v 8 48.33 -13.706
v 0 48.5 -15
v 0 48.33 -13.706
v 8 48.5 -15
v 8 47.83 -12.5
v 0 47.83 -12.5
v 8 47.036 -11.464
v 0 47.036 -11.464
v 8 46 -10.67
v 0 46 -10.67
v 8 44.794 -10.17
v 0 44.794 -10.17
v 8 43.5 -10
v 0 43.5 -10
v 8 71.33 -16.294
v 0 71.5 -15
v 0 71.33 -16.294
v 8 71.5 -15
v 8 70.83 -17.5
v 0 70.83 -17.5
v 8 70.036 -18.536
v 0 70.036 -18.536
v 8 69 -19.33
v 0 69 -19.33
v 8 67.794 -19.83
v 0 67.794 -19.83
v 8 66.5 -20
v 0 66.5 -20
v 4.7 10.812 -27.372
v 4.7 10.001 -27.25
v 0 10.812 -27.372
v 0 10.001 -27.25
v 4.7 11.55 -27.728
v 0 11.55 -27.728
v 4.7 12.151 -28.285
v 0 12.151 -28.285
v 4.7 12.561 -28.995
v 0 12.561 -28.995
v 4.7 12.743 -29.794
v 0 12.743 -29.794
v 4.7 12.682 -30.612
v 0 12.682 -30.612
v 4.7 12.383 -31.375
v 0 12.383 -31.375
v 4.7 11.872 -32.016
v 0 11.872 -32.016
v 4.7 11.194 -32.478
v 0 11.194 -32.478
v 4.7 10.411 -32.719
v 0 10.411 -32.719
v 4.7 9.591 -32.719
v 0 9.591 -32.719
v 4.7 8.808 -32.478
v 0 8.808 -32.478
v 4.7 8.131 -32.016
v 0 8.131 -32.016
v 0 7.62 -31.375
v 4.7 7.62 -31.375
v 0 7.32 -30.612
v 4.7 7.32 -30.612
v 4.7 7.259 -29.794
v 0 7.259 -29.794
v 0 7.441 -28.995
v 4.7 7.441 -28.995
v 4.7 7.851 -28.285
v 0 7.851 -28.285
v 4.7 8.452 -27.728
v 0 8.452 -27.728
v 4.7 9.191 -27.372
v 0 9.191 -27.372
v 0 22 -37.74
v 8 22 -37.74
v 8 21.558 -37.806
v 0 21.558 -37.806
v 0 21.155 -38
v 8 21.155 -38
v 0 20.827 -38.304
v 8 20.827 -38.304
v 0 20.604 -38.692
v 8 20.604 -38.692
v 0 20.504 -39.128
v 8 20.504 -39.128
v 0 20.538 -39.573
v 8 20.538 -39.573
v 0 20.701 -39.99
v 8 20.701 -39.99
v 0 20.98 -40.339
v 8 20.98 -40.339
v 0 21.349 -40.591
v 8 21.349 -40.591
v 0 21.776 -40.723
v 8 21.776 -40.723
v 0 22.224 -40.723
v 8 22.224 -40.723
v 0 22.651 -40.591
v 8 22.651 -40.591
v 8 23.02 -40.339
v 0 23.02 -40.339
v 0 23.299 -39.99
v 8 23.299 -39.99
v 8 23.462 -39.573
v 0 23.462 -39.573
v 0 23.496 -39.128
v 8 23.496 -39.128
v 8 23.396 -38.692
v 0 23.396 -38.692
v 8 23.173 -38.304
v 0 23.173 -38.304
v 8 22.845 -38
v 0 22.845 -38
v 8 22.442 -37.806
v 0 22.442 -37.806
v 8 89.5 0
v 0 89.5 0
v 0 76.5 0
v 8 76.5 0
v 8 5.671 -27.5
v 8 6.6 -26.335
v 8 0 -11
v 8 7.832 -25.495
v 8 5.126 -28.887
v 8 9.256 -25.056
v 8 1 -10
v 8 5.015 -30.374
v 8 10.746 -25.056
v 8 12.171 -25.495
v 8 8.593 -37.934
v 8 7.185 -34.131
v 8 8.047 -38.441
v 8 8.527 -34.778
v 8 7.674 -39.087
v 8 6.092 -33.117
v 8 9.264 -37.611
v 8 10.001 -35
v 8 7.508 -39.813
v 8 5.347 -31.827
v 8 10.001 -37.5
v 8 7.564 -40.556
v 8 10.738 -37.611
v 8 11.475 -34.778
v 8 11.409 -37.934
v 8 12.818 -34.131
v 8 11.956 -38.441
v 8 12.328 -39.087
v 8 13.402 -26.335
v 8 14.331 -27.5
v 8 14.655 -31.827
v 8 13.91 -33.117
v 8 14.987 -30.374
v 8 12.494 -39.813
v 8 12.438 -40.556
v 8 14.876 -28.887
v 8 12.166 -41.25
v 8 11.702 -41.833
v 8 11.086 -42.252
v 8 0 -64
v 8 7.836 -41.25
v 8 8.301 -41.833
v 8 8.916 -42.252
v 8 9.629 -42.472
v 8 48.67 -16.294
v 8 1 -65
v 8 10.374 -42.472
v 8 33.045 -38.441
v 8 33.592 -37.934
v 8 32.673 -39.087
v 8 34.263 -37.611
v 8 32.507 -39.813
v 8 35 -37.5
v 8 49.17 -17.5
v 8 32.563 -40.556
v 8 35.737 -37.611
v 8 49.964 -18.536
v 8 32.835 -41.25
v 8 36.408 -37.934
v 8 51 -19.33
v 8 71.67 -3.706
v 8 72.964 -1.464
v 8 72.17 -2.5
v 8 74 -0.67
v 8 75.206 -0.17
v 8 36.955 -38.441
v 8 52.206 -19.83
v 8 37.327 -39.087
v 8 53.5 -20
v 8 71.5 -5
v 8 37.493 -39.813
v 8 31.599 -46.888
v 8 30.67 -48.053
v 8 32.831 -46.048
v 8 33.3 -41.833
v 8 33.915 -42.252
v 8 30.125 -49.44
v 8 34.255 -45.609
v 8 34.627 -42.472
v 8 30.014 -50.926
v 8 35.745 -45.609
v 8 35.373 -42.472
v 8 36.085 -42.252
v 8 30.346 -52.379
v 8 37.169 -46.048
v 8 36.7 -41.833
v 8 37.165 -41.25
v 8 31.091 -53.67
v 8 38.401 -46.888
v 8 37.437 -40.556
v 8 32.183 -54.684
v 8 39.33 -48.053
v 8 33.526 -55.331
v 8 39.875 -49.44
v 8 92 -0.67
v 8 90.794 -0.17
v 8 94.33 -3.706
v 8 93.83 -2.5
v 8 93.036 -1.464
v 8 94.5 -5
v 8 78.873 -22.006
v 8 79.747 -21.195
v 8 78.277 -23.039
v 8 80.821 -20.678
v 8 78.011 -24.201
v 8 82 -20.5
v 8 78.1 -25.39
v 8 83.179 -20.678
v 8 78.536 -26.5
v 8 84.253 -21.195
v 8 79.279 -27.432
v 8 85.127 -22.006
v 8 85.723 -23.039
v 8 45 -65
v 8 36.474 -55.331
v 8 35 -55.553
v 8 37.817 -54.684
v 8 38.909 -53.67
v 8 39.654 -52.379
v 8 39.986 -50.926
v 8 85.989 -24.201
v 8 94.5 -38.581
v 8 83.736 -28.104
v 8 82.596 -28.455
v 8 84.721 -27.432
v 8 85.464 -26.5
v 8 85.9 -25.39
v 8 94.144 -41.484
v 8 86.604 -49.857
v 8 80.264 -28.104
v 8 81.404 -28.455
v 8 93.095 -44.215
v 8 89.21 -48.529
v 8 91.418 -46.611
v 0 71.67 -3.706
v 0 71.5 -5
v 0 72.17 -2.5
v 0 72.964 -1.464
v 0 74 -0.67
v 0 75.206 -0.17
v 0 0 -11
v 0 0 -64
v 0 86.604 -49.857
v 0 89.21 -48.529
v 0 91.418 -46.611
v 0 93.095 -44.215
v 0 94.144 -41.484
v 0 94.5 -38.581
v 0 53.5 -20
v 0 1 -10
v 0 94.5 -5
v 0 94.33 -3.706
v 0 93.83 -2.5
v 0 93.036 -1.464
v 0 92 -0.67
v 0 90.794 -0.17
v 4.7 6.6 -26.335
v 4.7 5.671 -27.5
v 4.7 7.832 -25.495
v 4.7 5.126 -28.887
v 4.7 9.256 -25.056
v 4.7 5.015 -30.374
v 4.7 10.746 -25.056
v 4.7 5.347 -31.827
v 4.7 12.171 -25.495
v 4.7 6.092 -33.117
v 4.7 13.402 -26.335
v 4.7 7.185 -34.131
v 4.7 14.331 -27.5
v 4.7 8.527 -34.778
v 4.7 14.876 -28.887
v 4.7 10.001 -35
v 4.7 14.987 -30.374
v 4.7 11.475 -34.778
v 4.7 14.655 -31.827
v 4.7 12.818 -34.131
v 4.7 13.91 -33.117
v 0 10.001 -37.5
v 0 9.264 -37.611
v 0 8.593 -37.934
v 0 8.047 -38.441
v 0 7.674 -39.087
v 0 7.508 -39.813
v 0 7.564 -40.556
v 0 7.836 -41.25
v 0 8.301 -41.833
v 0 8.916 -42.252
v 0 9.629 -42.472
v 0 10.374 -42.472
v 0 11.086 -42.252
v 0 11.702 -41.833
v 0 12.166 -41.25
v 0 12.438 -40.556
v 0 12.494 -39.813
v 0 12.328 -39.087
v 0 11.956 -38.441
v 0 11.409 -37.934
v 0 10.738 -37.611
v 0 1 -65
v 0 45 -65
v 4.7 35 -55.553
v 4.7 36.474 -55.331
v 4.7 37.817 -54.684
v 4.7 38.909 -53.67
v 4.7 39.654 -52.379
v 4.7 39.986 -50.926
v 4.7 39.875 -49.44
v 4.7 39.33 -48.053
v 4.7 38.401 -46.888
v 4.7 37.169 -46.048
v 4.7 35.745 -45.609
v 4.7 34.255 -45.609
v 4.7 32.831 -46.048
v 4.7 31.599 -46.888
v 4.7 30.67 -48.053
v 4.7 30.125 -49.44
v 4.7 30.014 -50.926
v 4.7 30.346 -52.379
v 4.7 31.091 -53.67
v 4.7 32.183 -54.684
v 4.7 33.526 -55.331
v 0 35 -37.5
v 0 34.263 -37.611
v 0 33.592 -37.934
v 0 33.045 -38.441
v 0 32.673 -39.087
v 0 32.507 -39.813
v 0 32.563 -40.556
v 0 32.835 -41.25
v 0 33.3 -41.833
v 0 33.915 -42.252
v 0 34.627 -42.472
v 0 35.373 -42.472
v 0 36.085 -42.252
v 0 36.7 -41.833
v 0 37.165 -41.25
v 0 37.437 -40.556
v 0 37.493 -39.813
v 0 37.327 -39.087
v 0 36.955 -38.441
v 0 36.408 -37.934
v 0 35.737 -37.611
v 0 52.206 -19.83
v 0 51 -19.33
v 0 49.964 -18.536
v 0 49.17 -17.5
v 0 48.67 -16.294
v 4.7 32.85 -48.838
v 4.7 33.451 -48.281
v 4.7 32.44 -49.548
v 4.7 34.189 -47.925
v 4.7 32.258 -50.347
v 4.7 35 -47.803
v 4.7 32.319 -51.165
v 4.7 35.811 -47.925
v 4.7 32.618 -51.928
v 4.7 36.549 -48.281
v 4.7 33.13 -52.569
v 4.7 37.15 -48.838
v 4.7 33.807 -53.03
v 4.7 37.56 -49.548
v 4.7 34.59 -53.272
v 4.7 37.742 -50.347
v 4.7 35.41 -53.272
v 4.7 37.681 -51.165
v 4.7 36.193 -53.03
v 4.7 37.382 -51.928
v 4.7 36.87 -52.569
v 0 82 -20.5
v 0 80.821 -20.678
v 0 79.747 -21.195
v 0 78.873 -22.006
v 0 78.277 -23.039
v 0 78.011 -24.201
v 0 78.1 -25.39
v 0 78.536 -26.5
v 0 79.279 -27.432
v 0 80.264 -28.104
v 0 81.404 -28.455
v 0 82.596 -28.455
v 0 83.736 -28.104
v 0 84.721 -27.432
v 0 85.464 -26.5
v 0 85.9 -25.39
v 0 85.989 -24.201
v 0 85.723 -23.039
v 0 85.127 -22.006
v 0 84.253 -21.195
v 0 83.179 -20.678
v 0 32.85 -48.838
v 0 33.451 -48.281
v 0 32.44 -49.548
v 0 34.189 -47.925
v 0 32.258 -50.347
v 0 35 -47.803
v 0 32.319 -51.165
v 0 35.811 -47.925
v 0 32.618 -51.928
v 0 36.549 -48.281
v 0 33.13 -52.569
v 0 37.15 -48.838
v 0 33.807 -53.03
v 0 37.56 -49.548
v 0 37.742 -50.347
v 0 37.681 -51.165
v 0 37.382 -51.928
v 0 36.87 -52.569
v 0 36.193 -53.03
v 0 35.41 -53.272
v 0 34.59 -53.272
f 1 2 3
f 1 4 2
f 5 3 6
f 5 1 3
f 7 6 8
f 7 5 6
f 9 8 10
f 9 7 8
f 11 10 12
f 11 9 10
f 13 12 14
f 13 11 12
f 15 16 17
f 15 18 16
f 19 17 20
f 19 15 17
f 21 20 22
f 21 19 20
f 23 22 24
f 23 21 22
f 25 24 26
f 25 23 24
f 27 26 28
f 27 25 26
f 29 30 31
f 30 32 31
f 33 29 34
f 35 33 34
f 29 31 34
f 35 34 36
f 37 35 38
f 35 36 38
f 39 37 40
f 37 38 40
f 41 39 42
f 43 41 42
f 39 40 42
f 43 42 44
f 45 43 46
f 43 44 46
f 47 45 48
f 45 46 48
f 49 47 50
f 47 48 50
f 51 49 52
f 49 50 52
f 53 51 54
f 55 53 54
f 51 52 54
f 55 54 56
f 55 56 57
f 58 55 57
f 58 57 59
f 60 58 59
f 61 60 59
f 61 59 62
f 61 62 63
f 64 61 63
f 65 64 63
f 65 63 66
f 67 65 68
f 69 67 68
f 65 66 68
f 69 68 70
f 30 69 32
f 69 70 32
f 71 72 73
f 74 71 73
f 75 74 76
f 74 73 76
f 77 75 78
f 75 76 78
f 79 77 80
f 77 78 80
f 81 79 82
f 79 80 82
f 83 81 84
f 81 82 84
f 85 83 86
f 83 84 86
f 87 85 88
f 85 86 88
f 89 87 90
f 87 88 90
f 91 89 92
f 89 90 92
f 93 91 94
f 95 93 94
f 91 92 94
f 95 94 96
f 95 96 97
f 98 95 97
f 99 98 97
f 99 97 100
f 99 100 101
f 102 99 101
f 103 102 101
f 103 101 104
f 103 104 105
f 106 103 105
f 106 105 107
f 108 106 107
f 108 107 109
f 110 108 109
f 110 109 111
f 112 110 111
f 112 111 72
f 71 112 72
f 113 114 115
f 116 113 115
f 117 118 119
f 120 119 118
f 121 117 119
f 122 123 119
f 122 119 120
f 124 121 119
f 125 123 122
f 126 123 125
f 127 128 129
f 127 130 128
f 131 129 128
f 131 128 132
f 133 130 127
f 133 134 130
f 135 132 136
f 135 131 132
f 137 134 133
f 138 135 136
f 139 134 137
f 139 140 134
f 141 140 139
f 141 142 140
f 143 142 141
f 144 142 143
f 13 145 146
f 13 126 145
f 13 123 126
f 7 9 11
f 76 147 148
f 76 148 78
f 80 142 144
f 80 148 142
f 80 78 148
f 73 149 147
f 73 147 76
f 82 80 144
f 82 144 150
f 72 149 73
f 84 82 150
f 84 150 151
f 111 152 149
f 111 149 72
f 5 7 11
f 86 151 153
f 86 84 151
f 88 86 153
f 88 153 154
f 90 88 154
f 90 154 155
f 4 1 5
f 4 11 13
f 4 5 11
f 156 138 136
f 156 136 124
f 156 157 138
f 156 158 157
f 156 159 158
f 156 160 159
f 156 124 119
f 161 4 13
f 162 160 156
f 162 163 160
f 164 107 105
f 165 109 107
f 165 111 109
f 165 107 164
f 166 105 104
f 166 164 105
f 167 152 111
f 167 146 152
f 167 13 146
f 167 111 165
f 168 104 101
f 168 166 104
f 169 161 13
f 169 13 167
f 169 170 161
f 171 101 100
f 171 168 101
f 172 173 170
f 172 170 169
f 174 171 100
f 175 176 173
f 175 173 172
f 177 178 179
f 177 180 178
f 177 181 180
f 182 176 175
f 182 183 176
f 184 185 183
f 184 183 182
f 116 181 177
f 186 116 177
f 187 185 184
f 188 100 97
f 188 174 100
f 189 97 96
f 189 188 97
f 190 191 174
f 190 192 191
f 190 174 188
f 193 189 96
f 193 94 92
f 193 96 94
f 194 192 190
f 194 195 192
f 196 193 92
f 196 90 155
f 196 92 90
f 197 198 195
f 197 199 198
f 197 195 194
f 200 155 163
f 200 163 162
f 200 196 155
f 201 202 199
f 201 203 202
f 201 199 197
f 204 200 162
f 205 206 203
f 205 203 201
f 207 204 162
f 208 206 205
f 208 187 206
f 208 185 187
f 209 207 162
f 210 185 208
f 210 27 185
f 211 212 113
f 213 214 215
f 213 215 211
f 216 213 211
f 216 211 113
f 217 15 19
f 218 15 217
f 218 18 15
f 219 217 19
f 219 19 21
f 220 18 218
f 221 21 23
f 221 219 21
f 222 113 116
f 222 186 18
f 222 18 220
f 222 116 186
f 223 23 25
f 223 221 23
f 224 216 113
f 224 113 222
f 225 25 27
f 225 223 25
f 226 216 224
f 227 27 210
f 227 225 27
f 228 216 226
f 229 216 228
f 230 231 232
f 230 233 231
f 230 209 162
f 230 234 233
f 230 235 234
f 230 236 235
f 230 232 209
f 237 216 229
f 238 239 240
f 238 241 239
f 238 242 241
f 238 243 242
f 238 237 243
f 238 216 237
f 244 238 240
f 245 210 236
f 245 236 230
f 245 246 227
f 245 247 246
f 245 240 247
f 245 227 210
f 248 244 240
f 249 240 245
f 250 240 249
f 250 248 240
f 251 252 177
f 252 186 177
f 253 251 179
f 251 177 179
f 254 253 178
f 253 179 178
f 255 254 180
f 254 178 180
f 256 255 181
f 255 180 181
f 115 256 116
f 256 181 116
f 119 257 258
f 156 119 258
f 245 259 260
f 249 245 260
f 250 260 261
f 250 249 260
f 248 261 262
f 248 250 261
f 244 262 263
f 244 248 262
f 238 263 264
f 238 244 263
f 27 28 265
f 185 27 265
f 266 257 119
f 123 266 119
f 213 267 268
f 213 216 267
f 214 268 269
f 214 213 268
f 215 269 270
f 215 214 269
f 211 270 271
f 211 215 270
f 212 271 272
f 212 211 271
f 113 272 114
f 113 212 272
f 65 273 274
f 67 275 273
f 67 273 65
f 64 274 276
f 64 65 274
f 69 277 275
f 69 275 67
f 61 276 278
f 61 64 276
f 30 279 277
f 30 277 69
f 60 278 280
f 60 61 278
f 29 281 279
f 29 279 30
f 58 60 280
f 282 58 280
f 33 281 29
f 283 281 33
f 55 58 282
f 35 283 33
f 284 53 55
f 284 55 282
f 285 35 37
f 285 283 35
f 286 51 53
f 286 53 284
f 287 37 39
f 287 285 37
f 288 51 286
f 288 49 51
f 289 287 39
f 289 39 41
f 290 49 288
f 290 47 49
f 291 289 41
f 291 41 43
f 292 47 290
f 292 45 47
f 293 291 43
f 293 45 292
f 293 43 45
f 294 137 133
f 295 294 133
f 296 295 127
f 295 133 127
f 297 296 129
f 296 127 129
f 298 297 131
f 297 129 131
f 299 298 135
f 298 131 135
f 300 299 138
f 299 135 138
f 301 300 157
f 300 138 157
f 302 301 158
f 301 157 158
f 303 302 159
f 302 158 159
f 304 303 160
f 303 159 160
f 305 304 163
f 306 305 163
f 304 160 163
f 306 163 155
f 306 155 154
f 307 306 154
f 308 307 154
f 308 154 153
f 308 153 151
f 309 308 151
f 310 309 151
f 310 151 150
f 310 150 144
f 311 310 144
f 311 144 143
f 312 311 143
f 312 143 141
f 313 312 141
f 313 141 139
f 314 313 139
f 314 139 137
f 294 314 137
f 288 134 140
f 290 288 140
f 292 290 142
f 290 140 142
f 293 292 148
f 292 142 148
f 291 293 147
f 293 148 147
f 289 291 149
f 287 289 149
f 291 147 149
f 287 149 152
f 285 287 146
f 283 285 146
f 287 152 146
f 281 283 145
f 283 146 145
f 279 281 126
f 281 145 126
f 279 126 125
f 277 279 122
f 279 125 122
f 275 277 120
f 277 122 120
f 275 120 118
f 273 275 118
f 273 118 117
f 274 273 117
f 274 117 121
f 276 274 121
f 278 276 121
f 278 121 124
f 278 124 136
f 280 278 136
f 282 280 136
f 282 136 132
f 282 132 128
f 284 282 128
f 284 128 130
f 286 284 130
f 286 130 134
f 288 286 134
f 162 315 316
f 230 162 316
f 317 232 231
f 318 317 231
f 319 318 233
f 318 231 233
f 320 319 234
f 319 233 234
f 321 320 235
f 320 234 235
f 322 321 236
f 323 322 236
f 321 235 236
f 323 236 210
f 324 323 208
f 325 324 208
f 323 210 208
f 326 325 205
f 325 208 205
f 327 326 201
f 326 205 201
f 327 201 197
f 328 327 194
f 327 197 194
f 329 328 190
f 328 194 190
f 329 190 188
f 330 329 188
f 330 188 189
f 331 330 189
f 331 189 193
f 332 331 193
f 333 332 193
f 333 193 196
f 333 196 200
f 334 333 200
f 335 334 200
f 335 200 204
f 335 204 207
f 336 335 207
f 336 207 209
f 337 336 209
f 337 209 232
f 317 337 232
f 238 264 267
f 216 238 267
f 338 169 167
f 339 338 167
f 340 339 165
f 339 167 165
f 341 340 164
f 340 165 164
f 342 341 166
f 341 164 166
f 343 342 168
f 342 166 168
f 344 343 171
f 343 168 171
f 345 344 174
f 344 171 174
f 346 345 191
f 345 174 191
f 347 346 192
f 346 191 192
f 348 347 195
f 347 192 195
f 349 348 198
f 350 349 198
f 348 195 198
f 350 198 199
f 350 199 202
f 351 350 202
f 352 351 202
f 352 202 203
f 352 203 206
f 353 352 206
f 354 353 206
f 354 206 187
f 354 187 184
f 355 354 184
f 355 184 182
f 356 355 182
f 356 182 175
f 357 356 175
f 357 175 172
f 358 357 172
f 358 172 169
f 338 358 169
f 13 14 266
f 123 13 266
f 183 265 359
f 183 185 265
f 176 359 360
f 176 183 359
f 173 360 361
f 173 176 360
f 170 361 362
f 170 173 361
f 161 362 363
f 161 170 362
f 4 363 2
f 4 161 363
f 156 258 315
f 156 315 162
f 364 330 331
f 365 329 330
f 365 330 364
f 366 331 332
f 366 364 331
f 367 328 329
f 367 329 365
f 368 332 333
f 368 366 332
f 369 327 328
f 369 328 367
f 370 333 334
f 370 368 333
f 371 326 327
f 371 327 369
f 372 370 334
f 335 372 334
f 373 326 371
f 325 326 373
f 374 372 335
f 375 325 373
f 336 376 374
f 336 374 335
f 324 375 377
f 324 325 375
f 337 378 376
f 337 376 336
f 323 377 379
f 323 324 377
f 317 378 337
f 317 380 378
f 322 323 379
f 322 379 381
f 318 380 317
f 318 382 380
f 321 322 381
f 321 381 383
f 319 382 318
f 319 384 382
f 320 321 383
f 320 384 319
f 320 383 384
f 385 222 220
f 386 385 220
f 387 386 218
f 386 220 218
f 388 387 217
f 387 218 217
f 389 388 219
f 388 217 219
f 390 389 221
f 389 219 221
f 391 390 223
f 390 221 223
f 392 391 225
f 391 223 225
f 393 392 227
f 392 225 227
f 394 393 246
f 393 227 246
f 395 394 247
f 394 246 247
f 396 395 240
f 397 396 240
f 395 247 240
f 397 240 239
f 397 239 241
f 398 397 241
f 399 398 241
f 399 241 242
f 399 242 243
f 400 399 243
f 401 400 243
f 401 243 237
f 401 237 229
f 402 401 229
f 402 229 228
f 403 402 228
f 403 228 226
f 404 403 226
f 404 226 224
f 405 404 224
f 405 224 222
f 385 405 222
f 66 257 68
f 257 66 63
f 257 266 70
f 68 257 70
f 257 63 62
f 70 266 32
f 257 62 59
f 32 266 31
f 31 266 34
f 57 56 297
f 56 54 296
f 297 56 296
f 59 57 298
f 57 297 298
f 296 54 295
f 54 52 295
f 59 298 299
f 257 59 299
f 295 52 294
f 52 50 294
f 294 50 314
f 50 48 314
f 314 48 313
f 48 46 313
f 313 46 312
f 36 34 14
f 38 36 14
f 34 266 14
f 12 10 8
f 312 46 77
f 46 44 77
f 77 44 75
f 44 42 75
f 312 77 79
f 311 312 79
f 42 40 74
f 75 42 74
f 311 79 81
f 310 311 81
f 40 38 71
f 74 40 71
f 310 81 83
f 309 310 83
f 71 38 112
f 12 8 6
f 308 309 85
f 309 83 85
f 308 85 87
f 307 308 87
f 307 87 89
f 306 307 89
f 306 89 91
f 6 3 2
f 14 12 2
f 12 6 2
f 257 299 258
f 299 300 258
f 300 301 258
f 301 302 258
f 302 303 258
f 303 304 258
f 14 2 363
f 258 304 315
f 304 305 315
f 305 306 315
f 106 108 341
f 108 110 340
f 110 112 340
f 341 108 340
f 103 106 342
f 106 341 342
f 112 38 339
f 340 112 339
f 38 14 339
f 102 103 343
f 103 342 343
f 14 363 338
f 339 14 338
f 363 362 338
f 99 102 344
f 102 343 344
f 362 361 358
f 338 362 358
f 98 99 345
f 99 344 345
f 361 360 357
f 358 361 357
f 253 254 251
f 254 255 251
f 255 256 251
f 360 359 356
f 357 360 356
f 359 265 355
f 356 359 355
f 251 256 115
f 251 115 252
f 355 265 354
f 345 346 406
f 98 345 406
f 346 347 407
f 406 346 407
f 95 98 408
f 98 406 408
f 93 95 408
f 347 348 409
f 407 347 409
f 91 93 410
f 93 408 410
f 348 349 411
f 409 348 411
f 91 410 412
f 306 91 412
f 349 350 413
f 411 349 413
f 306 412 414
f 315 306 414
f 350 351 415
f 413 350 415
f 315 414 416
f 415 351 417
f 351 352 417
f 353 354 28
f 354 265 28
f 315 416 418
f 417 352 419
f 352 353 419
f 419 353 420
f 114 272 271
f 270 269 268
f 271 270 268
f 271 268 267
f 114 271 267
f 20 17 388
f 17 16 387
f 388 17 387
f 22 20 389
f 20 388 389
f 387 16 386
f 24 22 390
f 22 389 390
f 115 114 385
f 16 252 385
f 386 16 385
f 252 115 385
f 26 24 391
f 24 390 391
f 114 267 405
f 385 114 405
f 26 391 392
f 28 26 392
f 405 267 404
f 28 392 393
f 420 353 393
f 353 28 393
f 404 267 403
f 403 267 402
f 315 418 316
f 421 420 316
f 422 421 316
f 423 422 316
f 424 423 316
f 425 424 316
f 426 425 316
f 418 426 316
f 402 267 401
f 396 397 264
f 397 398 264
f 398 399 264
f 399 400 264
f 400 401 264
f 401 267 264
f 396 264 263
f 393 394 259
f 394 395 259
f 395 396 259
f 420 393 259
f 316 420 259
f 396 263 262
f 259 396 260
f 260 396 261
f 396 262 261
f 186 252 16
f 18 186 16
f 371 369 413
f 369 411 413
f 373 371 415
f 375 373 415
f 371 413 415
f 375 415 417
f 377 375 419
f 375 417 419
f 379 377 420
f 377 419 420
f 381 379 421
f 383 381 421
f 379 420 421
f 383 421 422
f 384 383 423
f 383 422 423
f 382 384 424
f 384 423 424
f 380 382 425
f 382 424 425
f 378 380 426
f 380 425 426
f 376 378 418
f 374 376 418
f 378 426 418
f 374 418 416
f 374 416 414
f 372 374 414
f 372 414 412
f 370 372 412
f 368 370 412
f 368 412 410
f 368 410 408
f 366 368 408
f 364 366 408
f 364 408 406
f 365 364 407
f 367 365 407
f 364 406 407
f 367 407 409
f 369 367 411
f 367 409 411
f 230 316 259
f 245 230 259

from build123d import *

# Parameters (mm, degrees)
BOSS_EXTRUDE1_DEPTH                         = 8
FILLET1_R                                   = 12
FILLET2_R                                   = 5
FILLET3_R                                   = 5
CHAMFER2_SIZE                               = 1
F_5_0MM_DOWEL_HOLE3_D                       = 5
F_3_0MM_DOWEL_HOLE1_D                       = 3
CBORE_FOR_M5_CHEESE_HEAD_SCREW5_D           = 5.5
CBORE_FOR_M5_CHEESE_HEAD_SCREW5_CBORE_D     = 10
CBORE_FOR_M5_CHEESE_HEAD_SCREW5_CBORE_DEPTH = 3.3
CBORE_FOR_M5_CHEESE_HEAD_SCREW6_D           = 5.5
CBORE_FOR_M5_CHEESE_HEAD_SCREW6_CBORE_D     = 10
CBORE_FOR_M5_CHEESE_HEAD_SCREW6_CBORE_DEPTH = 3.3
F_8_0MM_DOWEL_HOLE3_D                       = 8


with BuildPart() as part:
    # Sketch1 → Boss-Extrude1 (new body)
    with BuildSketch(Plane(origin=(0, 0, 0), x_dir=(0, 0, -1), z_dir=(1, 0, 0))):
        Polygon((65, 0), (65, 45), (46.983473404, 94.5), (0, 94.5), (0, 71.5), (20, 71.5), (20, 48.5), (10, 48.5), (10, 0), align=None)
    extrude(amount=BOSS_EXTRUDE1_DEPTH)

    # Fillet1
    fillet1_edges = [part.edges().sort_by_distance(p)[0] for p in [
        (4, 94.5, -46.983473404),
    ]]
    fillet(fillet1_edges, radius=FILLET1_R)

    # Fillet2
    fillet2_edges = [part.edges().sort_by_distance(p)[0] for p in [
        (4, 94.5, 0),
    ]]
    fillet(fillet2_edges, radius=FILLET2_R)

    # Fillet3
    fillet3_edges = [part.edges().sort_by_distance(p)[0] for p in [
        (4, 48.5, -20),
        (4, 71.5, -20),
    ]]
    fillet(fillet3_edges, radius=FILLET3_R)
    fillet3_2_edges = [part.edges().sort_by_distance(p)[0] for p in [
        (4, 48.5, -10),
        (4, 71.5, 0),
    ]]
    fillet(fillet3_2_edges, radius=FILLET3_R - 0.0001)  # a hair under: the kernel refuses the full size

    # Chamfer2
    chamfer2_edges = [part.edges().sort_by_distance(p)[0] for p in [
        (4, 0, -65),
        (4, 0, -10),
    ]]
    chamfer(chamfer2_edges, length=CHAMFER2_SIZE)

    # Ø5.0mm Dowel Hole3 (through all)
    with Locations(Plane(origin=(0, 0, 0), x_dir=(0, 0, -1), z_dir=(-1, 0, 0))):
        with Locations((40, -35), (40, -10.001113523)):
            Hole(F_5_0MM_DOWEL_HOLE3_D / 2)

    # Ø3.0mm Dowel Hole1 (through all)
    with Locations(Plane(origin=(0, 0, 0), x_dir=(0, 0, -1), z_dir=(-1, 0, 0))):
        with Locations((39.239701592, -22)):
            Hole(F_3_0MM_DOWEL_HOLE1_D / 2)

    # CBORE for M5 Cheese Head Screw5 (through all)
    with Locations(Plane(origin=(8, 0, 0), x_dir=(0, 0, -1), z_dir=(1, 0, 0))):
        with Locations((30, 10.001113523)):
            CounterBoreHole(CBORE_FOR_M5_CHEESE_HEAD_SCREW5_D / 2, CBORE_FOR_M5_CHEESE_HEAD_SCREW5_CBORE_D / 2, CBORE_FOR_M5_CHEESE_HEAD_SCREW5_CBORE_DEPTH)

    # CBORE for M5 Cheese Head Screw6 (through all)
    with Locations(Plane(origin=(8, 0, 0), x_dir=(0, 0, -1), z_dir=(1, 0, 0))):
        with Locations((50.552772121, 35)):
            CounterBoreHole(CBORE_FOR_M5_CHEESE_HEAD_SCREW6_D / 2, CBORE_FOR_M5_CHEESE_HEAD_SCREW6_CBORE_D / 2, CBORE_FOR_M5_CHEESE_HEAD_SCREW6_CBORE_DEPTH)

    # Ø8.0mm Dowel Hole3 (through all)
    with Locations(Plane(origin=(0, 0, 0), x_dir=(0, 0, -1), z_dir=(-1, 0, 0))):
        with Locations((24.5, -82)):
            Hole(F_8_0MM_DOWEL_HOLE3_D / 2)


solid = part.part
